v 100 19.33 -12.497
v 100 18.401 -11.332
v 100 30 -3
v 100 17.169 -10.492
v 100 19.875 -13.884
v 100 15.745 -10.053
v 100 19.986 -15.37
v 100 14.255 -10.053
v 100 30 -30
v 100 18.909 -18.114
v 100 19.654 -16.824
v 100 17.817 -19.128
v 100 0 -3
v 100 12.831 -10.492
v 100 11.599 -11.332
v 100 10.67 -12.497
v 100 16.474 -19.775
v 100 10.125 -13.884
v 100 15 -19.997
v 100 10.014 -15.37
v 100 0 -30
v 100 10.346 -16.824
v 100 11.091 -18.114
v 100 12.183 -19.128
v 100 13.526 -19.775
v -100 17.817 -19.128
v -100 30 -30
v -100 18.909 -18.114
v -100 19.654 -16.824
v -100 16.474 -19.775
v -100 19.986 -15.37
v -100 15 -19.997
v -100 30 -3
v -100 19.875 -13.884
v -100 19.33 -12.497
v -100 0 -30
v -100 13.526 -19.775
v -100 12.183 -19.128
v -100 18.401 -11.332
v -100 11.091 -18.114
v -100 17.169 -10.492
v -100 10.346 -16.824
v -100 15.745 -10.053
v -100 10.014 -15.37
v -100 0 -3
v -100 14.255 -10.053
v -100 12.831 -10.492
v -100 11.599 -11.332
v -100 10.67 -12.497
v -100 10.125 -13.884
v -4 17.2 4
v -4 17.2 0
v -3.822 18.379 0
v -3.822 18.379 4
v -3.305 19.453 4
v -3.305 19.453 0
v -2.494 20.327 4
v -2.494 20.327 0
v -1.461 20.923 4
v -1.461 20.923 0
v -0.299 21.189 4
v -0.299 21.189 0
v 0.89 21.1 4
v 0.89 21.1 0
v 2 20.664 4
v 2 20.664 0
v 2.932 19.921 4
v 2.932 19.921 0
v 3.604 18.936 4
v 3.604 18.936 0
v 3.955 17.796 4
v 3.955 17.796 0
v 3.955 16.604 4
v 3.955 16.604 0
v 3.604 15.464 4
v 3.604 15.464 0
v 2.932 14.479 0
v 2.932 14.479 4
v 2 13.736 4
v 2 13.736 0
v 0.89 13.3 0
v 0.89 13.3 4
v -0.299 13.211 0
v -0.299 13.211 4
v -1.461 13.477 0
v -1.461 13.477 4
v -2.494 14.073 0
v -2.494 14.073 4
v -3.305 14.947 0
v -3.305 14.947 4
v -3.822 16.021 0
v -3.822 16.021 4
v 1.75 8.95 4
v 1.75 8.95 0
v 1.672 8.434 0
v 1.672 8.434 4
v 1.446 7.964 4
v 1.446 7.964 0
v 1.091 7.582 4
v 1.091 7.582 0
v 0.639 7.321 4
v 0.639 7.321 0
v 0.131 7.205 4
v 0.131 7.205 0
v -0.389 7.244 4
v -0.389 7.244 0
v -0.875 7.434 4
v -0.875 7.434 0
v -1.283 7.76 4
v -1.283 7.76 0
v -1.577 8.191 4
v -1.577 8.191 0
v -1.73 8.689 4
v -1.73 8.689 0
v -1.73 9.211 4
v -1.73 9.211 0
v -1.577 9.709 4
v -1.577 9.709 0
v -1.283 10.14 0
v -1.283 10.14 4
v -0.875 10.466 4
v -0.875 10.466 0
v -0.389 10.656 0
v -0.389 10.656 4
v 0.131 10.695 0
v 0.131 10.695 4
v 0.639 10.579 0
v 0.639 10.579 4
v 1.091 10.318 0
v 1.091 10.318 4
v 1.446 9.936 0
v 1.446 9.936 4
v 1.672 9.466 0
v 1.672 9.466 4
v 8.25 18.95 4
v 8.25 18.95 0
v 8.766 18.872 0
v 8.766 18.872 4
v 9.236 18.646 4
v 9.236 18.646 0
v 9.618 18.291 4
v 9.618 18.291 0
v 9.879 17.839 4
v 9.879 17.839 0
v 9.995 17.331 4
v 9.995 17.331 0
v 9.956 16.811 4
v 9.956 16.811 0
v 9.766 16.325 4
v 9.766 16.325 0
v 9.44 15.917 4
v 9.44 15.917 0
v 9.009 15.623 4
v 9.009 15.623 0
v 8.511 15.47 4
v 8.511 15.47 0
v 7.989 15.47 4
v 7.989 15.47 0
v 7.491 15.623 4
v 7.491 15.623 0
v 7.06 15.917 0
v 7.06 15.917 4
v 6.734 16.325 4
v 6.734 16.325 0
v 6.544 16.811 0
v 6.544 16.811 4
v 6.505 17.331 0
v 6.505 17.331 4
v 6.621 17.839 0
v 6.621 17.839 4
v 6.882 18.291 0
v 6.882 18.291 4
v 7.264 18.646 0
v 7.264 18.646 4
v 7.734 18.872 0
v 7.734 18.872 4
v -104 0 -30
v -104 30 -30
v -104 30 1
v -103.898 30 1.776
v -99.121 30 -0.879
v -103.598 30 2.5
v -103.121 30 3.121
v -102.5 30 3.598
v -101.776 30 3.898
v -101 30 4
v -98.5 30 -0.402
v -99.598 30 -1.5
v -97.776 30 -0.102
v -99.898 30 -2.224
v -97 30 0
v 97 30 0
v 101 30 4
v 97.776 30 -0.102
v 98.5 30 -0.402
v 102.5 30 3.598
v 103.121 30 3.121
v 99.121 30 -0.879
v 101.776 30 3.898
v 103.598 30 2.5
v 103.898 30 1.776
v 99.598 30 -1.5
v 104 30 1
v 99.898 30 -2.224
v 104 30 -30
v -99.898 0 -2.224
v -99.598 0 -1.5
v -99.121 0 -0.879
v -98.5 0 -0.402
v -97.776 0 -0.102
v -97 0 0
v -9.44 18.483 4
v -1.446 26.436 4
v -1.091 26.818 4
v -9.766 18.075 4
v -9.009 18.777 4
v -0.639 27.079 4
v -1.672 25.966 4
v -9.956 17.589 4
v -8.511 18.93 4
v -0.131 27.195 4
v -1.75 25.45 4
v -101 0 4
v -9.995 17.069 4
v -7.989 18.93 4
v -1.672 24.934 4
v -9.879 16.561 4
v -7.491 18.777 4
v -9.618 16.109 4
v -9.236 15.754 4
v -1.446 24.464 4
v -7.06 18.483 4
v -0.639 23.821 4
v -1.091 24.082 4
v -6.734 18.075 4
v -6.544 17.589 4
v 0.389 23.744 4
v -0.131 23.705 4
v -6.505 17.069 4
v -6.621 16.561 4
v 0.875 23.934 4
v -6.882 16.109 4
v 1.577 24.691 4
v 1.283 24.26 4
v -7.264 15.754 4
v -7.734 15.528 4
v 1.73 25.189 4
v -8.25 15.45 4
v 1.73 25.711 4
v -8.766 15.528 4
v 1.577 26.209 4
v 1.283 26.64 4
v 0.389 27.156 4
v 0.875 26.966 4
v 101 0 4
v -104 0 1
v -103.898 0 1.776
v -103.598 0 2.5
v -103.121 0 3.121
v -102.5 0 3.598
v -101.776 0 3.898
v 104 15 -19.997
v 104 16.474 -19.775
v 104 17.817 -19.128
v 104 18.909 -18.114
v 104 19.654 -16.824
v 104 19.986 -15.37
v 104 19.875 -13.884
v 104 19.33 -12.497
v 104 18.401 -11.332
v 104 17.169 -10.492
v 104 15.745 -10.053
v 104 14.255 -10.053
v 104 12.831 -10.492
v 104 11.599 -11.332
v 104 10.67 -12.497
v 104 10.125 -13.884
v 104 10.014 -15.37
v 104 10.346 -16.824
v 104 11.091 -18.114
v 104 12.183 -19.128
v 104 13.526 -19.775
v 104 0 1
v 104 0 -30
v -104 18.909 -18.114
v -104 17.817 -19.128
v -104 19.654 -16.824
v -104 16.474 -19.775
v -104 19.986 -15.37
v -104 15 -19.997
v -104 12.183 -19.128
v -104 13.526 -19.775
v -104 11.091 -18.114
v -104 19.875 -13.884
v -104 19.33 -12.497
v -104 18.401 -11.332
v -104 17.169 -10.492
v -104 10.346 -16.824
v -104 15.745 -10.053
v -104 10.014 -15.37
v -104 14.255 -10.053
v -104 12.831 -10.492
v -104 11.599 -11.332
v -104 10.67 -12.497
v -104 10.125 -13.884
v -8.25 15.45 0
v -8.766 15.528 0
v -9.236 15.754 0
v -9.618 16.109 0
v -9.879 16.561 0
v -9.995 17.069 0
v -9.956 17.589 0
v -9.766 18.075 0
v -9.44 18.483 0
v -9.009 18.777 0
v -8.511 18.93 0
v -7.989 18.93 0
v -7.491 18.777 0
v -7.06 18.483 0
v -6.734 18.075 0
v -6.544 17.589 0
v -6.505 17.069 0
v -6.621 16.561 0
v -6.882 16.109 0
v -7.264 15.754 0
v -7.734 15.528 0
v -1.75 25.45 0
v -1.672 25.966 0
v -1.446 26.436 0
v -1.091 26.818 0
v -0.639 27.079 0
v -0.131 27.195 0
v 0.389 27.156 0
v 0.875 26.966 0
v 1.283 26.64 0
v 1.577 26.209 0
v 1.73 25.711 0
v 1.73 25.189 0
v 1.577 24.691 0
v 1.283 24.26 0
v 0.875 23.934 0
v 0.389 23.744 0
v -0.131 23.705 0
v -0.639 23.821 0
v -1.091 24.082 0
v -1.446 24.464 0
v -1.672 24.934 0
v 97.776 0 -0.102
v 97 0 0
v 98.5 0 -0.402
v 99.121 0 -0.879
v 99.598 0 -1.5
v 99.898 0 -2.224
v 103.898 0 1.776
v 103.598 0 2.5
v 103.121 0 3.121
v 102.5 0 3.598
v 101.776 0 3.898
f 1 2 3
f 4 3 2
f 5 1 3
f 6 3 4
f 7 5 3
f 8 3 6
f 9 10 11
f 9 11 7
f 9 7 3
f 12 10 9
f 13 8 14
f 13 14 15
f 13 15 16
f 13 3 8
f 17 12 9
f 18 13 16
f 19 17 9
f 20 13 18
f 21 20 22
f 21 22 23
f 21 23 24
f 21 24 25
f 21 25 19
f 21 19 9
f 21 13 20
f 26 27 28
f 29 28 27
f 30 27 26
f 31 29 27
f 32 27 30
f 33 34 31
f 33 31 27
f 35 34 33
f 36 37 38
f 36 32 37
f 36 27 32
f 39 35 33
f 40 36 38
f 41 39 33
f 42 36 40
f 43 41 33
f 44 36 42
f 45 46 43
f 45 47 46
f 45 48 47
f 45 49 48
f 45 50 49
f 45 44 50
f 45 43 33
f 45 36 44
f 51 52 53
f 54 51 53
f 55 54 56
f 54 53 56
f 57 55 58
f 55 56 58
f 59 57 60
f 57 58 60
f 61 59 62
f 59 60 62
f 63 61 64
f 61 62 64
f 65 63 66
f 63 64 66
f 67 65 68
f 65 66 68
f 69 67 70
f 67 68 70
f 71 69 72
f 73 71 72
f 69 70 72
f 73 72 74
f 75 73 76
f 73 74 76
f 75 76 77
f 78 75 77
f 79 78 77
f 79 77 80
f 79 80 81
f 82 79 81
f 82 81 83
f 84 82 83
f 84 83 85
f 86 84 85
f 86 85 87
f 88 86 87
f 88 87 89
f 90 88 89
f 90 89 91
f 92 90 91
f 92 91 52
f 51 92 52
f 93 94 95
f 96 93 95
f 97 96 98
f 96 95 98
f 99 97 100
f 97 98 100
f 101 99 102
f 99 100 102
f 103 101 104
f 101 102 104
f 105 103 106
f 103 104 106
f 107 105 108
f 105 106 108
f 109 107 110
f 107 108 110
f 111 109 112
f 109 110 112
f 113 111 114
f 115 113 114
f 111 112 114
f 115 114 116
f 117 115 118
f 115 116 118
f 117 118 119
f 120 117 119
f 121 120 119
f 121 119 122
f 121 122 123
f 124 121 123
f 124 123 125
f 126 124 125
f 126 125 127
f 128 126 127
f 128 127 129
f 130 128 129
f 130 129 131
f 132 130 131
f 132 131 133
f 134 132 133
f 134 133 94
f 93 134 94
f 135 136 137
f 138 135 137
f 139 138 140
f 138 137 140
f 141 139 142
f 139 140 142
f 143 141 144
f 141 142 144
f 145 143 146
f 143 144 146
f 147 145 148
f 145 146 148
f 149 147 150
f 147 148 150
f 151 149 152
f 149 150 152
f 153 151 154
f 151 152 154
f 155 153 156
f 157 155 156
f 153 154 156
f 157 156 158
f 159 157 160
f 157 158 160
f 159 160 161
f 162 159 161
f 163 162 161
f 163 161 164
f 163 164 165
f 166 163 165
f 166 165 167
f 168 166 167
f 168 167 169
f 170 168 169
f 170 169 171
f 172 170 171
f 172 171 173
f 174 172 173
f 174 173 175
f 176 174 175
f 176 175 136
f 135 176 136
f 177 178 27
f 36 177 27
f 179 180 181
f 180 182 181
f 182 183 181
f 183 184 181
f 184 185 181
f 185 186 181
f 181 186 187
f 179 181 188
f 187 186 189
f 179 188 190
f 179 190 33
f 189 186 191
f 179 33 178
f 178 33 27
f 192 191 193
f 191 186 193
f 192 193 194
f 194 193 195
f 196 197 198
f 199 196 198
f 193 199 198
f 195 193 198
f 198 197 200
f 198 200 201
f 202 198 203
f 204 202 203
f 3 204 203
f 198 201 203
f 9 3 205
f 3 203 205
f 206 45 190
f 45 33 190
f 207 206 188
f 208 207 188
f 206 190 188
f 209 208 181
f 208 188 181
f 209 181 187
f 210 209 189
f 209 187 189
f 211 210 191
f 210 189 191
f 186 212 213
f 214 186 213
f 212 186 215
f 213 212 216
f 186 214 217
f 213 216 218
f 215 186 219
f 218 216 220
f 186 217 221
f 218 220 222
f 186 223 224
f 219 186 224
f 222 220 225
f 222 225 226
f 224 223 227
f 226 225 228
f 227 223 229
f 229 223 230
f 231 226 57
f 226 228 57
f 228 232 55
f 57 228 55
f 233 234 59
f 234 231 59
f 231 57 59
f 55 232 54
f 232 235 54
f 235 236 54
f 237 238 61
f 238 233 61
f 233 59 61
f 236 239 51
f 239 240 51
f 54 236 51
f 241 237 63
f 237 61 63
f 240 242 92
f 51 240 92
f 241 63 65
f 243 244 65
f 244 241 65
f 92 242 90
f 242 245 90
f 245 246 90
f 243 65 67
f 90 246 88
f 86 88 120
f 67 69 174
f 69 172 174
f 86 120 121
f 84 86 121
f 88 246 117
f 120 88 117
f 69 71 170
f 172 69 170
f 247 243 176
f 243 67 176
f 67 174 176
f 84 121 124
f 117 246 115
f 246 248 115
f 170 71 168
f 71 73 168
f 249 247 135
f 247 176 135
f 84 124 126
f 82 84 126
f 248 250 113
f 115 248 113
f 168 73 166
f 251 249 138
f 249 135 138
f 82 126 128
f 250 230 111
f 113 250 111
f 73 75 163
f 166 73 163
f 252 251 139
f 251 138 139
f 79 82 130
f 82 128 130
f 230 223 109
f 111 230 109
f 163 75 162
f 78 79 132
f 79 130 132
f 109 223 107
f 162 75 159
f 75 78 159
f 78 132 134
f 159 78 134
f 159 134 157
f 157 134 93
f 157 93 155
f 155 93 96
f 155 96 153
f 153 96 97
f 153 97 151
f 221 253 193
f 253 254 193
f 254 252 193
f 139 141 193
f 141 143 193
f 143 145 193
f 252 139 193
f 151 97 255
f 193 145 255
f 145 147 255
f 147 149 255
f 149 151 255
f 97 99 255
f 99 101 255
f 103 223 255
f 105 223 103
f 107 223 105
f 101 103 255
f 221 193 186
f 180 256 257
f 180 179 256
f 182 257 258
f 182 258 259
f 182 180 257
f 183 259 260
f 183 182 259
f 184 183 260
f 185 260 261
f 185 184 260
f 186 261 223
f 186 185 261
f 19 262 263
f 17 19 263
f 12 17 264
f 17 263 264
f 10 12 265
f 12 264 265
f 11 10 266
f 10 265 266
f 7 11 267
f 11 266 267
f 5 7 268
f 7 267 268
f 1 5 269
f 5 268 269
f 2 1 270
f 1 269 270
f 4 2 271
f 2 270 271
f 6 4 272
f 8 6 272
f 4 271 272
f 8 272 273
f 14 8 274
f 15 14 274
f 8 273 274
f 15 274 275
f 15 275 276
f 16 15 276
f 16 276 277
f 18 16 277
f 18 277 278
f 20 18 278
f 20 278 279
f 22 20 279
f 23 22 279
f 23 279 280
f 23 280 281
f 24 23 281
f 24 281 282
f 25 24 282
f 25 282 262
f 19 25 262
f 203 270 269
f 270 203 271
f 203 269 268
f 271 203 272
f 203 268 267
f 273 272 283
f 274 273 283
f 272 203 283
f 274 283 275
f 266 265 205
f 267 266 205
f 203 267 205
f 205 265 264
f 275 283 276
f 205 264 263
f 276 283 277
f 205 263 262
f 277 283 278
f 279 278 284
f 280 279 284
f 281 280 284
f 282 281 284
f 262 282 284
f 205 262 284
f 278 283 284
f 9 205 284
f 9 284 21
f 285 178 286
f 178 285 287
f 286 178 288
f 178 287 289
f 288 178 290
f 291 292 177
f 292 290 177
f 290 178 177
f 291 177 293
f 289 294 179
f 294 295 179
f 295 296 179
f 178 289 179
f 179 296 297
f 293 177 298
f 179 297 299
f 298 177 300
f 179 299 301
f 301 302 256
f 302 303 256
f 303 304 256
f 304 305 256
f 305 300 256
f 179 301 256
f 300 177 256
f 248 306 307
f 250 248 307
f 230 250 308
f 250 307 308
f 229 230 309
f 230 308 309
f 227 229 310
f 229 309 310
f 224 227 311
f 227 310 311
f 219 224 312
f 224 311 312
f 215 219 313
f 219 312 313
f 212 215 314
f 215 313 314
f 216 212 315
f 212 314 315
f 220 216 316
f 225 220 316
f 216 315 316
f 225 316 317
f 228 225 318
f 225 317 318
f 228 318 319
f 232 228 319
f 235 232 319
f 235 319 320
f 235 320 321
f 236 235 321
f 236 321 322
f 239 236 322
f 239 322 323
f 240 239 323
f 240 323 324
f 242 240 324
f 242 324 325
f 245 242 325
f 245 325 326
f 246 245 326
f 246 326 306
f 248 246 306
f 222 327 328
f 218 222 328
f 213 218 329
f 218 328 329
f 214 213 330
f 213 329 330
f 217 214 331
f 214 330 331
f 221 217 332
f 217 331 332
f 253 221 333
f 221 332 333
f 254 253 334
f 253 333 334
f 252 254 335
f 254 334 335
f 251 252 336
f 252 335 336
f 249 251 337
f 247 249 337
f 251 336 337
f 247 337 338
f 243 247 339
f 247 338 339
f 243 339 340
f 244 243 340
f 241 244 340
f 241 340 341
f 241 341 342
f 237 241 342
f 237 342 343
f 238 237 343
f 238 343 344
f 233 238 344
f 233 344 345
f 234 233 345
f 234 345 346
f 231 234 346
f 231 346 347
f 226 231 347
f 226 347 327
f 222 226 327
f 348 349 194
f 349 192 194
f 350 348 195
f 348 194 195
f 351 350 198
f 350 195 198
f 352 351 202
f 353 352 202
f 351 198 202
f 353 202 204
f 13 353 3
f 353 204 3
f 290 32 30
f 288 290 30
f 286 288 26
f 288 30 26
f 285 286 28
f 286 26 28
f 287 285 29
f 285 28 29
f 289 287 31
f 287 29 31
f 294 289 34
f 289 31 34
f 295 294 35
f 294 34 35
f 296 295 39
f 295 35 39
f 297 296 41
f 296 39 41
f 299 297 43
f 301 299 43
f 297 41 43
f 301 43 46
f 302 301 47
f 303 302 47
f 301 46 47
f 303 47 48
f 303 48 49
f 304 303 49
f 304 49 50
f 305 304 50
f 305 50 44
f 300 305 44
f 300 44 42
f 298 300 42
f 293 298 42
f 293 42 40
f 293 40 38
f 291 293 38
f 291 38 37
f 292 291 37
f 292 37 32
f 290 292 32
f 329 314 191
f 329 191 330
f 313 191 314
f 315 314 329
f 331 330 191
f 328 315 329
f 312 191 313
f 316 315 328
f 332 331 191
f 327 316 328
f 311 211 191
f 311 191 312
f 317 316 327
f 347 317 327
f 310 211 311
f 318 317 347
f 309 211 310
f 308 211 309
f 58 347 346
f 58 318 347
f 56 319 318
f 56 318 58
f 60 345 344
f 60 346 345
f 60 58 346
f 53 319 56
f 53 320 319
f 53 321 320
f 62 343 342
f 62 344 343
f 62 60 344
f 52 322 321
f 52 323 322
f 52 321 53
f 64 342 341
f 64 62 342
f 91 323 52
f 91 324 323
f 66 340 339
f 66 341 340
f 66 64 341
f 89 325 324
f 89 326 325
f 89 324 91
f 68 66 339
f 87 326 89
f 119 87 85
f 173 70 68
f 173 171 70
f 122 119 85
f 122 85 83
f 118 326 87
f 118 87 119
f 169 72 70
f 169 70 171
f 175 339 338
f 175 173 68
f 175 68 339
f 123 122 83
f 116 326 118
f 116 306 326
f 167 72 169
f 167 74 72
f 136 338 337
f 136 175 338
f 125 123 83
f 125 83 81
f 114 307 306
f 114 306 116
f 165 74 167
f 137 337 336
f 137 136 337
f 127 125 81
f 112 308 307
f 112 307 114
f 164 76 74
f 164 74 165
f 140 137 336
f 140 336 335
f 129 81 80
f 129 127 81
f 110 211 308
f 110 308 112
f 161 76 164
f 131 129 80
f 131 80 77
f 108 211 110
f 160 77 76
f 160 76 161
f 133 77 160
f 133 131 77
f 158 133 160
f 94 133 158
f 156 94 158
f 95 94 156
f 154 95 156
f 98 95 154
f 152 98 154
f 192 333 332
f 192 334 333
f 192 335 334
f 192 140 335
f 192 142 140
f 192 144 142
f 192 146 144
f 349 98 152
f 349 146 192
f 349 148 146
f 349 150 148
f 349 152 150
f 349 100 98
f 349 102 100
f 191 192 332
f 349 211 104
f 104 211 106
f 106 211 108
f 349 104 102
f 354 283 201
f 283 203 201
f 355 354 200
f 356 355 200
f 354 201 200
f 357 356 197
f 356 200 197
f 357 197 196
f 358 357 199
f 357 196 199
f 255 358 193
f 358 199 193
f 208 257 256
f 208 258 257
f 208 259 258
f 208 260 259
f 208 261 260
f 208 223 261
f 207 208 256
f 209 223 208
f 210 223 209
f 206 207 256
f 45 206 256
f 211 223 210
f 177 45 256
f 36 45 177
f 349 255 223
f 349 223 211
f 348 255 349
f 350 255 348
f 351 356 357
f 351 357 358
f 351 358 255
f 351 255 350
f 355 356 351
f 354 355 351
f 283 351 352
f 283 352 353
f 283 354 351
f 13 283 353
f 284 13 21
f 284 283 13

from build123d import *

# Parameters (mm, degrees)
SURFACE_EXTRUDE1_1_DEPTH = 30
THICKEN2_T2              = 4
SURFACE_EXTRUDE2_2_DEPTH = 20
THICKEN3_T2              = 4
FILLET1_R                = 3
SKETCH3_R                = 5
CUT_EXTRUDE1_DEPTH       = 217.018517725
CUT_EXTRUDE1_DEPTH_BACK  = 217.018517725
SKETCH4_R                = 4
CUT_EXTRUDE3_DEPTH       = 10
SKETCH5_R                = 1.75
CUT_EXTRUDE4_DEPTH       = 10
CIRPATTERN1_COUNT        = 4
SKETCH6_W                = 50
SKETCH6_H                = 20
CUT_EXTRUDE5_DEPTH       = 10


with BuildPart() as body_1:
    # Surface-Extrude1: a surface, the sketch's curves swept straight by 30 mm
    with BuildLine(Plane(origin=(0, 0, 0), x_dir=(1, 0, 0), z_dir=(0, 1, 0)), mode=Mode.PRIVATE) as surface_extrude1_1_path:
        Line((-100, 30), (-100, 0))
        Line((-100, 0), (100, 0))
        Line((100, 0), (100, 30))
    surface_extrude1_1 = Shell.extrude(surface_extrude1_1_path.wire(), (0 * SURFACE_EXTRUDE1_1_DEPTH, 1 * SURFACE_EXTRUDE1_1_DEPTH, 0 * SURFACE_EXTRUDE1_1_DEPTH))
    add(Solid.thicken(surface_extrude1_1, -THICKEN2_T2))

    # Surface-Extrude2: a surface, the sketch's curves swept straight by 20 mm
    with BuildLine(Plane(origin=(0, 30, 0), x_dir=(1, 0, 0), z_dir=(0, 1, 0)), mode=Mode.PRIVATE) as surface_extrude2_2_path:
        Line((-25, 0), (25, 0))
    surface_extrude2_2 = Shell.extrude(surface_extrude2_2_path.wire(), (0 * SURFACE_EXTRUDE2_2_DEPTH, 1 * SURFACE_EXTRUDE2_2_DEPTH, 0 * SURFACE_EXTRUDE2_2_DEPTH))
    add(Solid.thicken(surface_extrude2_2, -THICKEN3_T2))

    # Fillet1
    fillet1_edges = [body_1.edges().sort_by_distance(p)[0] for p in [
        (-100, 15, 0),
        (100, 15, 0),
        (104, 15, 4),
        (-104, 15, 4),
    ]]
    fillet(fillet1_edges, radius=FILLET1_R)

    # Sketch3 → Cut-Extrude1 (cut, two sides)
    with BuildSketch(Plane(origin=(104, 0, 0), x_dir=(0, 0, -1), z_dir=(1, 0, 0))) as cut_extrude1_sk:
        with Locations((14.996831486, 15)):
            Circle(SKETCH3_R)
    extrude(amount=CUT_EXTRUDE1_DEPTH, mode=Mode.SUBTRACT)
    extrude(cut_extrude1_sk.sketch, amount=-CUT_EXTRUDE1_DEPTH_BACK, mode=Mode.SUBTRACT)

    # Sketch4 → Cut-Extrude3 (cut)
    with BuildSketch(Plane(origin=(0, 0, 0), x_dir=(-1, 0, 0), z_dir=(0, 0, -1))):
        with Locations((0, 17.2)):
            Circle(SKETCH4_R)
    extrude(amount=-CUT_EXTRUDE3_DEPTH, mode=Mode.SUBTRACT)

    # Sketch5 → Cut-Extrude4 (cut)
    with BuildSketch(Plane(origin=(0, 0, 0), x_dir=(-1, 0, 0), z_dir=(0, 0, -1))):
        with Locations((0, 25.45)):
            Circle(SKETCH5_R)
    cut_extrude4 = extrude(amount=-CUT_EXTRUDE4_DEPTH, mode=Mode.SUBTRACT)

    # CirPattern1: Cut-Extrude4 ×4 about axis
    cirpattern1_axis = Axis((0, 17.2, 0), (0, 0, 1))
    for i in range(1, CIRPATTERN1_COUNT):
        add(cut_extrude4.rotate(cirpattern1_axis, i * 360 / CIRPATTERN1_COUNT), mode=Mode.SUBTRACT)

    # Sketch6 → Cut-Extrude5 (cut)
    with BuildSketch(Plane(origin=(0, 0, 0), x_dir=(-1, 0, 0), z_dir=(0, 0, -1))):
        with Locations((0, 40)):
            Rectangle(SKETCH6_W, SKETCH6_H)
    extrude(amount=-CUT_EXTRUDE5_DEPTH, mode=Mode.SUBTRACT)


solid = body_1.part
